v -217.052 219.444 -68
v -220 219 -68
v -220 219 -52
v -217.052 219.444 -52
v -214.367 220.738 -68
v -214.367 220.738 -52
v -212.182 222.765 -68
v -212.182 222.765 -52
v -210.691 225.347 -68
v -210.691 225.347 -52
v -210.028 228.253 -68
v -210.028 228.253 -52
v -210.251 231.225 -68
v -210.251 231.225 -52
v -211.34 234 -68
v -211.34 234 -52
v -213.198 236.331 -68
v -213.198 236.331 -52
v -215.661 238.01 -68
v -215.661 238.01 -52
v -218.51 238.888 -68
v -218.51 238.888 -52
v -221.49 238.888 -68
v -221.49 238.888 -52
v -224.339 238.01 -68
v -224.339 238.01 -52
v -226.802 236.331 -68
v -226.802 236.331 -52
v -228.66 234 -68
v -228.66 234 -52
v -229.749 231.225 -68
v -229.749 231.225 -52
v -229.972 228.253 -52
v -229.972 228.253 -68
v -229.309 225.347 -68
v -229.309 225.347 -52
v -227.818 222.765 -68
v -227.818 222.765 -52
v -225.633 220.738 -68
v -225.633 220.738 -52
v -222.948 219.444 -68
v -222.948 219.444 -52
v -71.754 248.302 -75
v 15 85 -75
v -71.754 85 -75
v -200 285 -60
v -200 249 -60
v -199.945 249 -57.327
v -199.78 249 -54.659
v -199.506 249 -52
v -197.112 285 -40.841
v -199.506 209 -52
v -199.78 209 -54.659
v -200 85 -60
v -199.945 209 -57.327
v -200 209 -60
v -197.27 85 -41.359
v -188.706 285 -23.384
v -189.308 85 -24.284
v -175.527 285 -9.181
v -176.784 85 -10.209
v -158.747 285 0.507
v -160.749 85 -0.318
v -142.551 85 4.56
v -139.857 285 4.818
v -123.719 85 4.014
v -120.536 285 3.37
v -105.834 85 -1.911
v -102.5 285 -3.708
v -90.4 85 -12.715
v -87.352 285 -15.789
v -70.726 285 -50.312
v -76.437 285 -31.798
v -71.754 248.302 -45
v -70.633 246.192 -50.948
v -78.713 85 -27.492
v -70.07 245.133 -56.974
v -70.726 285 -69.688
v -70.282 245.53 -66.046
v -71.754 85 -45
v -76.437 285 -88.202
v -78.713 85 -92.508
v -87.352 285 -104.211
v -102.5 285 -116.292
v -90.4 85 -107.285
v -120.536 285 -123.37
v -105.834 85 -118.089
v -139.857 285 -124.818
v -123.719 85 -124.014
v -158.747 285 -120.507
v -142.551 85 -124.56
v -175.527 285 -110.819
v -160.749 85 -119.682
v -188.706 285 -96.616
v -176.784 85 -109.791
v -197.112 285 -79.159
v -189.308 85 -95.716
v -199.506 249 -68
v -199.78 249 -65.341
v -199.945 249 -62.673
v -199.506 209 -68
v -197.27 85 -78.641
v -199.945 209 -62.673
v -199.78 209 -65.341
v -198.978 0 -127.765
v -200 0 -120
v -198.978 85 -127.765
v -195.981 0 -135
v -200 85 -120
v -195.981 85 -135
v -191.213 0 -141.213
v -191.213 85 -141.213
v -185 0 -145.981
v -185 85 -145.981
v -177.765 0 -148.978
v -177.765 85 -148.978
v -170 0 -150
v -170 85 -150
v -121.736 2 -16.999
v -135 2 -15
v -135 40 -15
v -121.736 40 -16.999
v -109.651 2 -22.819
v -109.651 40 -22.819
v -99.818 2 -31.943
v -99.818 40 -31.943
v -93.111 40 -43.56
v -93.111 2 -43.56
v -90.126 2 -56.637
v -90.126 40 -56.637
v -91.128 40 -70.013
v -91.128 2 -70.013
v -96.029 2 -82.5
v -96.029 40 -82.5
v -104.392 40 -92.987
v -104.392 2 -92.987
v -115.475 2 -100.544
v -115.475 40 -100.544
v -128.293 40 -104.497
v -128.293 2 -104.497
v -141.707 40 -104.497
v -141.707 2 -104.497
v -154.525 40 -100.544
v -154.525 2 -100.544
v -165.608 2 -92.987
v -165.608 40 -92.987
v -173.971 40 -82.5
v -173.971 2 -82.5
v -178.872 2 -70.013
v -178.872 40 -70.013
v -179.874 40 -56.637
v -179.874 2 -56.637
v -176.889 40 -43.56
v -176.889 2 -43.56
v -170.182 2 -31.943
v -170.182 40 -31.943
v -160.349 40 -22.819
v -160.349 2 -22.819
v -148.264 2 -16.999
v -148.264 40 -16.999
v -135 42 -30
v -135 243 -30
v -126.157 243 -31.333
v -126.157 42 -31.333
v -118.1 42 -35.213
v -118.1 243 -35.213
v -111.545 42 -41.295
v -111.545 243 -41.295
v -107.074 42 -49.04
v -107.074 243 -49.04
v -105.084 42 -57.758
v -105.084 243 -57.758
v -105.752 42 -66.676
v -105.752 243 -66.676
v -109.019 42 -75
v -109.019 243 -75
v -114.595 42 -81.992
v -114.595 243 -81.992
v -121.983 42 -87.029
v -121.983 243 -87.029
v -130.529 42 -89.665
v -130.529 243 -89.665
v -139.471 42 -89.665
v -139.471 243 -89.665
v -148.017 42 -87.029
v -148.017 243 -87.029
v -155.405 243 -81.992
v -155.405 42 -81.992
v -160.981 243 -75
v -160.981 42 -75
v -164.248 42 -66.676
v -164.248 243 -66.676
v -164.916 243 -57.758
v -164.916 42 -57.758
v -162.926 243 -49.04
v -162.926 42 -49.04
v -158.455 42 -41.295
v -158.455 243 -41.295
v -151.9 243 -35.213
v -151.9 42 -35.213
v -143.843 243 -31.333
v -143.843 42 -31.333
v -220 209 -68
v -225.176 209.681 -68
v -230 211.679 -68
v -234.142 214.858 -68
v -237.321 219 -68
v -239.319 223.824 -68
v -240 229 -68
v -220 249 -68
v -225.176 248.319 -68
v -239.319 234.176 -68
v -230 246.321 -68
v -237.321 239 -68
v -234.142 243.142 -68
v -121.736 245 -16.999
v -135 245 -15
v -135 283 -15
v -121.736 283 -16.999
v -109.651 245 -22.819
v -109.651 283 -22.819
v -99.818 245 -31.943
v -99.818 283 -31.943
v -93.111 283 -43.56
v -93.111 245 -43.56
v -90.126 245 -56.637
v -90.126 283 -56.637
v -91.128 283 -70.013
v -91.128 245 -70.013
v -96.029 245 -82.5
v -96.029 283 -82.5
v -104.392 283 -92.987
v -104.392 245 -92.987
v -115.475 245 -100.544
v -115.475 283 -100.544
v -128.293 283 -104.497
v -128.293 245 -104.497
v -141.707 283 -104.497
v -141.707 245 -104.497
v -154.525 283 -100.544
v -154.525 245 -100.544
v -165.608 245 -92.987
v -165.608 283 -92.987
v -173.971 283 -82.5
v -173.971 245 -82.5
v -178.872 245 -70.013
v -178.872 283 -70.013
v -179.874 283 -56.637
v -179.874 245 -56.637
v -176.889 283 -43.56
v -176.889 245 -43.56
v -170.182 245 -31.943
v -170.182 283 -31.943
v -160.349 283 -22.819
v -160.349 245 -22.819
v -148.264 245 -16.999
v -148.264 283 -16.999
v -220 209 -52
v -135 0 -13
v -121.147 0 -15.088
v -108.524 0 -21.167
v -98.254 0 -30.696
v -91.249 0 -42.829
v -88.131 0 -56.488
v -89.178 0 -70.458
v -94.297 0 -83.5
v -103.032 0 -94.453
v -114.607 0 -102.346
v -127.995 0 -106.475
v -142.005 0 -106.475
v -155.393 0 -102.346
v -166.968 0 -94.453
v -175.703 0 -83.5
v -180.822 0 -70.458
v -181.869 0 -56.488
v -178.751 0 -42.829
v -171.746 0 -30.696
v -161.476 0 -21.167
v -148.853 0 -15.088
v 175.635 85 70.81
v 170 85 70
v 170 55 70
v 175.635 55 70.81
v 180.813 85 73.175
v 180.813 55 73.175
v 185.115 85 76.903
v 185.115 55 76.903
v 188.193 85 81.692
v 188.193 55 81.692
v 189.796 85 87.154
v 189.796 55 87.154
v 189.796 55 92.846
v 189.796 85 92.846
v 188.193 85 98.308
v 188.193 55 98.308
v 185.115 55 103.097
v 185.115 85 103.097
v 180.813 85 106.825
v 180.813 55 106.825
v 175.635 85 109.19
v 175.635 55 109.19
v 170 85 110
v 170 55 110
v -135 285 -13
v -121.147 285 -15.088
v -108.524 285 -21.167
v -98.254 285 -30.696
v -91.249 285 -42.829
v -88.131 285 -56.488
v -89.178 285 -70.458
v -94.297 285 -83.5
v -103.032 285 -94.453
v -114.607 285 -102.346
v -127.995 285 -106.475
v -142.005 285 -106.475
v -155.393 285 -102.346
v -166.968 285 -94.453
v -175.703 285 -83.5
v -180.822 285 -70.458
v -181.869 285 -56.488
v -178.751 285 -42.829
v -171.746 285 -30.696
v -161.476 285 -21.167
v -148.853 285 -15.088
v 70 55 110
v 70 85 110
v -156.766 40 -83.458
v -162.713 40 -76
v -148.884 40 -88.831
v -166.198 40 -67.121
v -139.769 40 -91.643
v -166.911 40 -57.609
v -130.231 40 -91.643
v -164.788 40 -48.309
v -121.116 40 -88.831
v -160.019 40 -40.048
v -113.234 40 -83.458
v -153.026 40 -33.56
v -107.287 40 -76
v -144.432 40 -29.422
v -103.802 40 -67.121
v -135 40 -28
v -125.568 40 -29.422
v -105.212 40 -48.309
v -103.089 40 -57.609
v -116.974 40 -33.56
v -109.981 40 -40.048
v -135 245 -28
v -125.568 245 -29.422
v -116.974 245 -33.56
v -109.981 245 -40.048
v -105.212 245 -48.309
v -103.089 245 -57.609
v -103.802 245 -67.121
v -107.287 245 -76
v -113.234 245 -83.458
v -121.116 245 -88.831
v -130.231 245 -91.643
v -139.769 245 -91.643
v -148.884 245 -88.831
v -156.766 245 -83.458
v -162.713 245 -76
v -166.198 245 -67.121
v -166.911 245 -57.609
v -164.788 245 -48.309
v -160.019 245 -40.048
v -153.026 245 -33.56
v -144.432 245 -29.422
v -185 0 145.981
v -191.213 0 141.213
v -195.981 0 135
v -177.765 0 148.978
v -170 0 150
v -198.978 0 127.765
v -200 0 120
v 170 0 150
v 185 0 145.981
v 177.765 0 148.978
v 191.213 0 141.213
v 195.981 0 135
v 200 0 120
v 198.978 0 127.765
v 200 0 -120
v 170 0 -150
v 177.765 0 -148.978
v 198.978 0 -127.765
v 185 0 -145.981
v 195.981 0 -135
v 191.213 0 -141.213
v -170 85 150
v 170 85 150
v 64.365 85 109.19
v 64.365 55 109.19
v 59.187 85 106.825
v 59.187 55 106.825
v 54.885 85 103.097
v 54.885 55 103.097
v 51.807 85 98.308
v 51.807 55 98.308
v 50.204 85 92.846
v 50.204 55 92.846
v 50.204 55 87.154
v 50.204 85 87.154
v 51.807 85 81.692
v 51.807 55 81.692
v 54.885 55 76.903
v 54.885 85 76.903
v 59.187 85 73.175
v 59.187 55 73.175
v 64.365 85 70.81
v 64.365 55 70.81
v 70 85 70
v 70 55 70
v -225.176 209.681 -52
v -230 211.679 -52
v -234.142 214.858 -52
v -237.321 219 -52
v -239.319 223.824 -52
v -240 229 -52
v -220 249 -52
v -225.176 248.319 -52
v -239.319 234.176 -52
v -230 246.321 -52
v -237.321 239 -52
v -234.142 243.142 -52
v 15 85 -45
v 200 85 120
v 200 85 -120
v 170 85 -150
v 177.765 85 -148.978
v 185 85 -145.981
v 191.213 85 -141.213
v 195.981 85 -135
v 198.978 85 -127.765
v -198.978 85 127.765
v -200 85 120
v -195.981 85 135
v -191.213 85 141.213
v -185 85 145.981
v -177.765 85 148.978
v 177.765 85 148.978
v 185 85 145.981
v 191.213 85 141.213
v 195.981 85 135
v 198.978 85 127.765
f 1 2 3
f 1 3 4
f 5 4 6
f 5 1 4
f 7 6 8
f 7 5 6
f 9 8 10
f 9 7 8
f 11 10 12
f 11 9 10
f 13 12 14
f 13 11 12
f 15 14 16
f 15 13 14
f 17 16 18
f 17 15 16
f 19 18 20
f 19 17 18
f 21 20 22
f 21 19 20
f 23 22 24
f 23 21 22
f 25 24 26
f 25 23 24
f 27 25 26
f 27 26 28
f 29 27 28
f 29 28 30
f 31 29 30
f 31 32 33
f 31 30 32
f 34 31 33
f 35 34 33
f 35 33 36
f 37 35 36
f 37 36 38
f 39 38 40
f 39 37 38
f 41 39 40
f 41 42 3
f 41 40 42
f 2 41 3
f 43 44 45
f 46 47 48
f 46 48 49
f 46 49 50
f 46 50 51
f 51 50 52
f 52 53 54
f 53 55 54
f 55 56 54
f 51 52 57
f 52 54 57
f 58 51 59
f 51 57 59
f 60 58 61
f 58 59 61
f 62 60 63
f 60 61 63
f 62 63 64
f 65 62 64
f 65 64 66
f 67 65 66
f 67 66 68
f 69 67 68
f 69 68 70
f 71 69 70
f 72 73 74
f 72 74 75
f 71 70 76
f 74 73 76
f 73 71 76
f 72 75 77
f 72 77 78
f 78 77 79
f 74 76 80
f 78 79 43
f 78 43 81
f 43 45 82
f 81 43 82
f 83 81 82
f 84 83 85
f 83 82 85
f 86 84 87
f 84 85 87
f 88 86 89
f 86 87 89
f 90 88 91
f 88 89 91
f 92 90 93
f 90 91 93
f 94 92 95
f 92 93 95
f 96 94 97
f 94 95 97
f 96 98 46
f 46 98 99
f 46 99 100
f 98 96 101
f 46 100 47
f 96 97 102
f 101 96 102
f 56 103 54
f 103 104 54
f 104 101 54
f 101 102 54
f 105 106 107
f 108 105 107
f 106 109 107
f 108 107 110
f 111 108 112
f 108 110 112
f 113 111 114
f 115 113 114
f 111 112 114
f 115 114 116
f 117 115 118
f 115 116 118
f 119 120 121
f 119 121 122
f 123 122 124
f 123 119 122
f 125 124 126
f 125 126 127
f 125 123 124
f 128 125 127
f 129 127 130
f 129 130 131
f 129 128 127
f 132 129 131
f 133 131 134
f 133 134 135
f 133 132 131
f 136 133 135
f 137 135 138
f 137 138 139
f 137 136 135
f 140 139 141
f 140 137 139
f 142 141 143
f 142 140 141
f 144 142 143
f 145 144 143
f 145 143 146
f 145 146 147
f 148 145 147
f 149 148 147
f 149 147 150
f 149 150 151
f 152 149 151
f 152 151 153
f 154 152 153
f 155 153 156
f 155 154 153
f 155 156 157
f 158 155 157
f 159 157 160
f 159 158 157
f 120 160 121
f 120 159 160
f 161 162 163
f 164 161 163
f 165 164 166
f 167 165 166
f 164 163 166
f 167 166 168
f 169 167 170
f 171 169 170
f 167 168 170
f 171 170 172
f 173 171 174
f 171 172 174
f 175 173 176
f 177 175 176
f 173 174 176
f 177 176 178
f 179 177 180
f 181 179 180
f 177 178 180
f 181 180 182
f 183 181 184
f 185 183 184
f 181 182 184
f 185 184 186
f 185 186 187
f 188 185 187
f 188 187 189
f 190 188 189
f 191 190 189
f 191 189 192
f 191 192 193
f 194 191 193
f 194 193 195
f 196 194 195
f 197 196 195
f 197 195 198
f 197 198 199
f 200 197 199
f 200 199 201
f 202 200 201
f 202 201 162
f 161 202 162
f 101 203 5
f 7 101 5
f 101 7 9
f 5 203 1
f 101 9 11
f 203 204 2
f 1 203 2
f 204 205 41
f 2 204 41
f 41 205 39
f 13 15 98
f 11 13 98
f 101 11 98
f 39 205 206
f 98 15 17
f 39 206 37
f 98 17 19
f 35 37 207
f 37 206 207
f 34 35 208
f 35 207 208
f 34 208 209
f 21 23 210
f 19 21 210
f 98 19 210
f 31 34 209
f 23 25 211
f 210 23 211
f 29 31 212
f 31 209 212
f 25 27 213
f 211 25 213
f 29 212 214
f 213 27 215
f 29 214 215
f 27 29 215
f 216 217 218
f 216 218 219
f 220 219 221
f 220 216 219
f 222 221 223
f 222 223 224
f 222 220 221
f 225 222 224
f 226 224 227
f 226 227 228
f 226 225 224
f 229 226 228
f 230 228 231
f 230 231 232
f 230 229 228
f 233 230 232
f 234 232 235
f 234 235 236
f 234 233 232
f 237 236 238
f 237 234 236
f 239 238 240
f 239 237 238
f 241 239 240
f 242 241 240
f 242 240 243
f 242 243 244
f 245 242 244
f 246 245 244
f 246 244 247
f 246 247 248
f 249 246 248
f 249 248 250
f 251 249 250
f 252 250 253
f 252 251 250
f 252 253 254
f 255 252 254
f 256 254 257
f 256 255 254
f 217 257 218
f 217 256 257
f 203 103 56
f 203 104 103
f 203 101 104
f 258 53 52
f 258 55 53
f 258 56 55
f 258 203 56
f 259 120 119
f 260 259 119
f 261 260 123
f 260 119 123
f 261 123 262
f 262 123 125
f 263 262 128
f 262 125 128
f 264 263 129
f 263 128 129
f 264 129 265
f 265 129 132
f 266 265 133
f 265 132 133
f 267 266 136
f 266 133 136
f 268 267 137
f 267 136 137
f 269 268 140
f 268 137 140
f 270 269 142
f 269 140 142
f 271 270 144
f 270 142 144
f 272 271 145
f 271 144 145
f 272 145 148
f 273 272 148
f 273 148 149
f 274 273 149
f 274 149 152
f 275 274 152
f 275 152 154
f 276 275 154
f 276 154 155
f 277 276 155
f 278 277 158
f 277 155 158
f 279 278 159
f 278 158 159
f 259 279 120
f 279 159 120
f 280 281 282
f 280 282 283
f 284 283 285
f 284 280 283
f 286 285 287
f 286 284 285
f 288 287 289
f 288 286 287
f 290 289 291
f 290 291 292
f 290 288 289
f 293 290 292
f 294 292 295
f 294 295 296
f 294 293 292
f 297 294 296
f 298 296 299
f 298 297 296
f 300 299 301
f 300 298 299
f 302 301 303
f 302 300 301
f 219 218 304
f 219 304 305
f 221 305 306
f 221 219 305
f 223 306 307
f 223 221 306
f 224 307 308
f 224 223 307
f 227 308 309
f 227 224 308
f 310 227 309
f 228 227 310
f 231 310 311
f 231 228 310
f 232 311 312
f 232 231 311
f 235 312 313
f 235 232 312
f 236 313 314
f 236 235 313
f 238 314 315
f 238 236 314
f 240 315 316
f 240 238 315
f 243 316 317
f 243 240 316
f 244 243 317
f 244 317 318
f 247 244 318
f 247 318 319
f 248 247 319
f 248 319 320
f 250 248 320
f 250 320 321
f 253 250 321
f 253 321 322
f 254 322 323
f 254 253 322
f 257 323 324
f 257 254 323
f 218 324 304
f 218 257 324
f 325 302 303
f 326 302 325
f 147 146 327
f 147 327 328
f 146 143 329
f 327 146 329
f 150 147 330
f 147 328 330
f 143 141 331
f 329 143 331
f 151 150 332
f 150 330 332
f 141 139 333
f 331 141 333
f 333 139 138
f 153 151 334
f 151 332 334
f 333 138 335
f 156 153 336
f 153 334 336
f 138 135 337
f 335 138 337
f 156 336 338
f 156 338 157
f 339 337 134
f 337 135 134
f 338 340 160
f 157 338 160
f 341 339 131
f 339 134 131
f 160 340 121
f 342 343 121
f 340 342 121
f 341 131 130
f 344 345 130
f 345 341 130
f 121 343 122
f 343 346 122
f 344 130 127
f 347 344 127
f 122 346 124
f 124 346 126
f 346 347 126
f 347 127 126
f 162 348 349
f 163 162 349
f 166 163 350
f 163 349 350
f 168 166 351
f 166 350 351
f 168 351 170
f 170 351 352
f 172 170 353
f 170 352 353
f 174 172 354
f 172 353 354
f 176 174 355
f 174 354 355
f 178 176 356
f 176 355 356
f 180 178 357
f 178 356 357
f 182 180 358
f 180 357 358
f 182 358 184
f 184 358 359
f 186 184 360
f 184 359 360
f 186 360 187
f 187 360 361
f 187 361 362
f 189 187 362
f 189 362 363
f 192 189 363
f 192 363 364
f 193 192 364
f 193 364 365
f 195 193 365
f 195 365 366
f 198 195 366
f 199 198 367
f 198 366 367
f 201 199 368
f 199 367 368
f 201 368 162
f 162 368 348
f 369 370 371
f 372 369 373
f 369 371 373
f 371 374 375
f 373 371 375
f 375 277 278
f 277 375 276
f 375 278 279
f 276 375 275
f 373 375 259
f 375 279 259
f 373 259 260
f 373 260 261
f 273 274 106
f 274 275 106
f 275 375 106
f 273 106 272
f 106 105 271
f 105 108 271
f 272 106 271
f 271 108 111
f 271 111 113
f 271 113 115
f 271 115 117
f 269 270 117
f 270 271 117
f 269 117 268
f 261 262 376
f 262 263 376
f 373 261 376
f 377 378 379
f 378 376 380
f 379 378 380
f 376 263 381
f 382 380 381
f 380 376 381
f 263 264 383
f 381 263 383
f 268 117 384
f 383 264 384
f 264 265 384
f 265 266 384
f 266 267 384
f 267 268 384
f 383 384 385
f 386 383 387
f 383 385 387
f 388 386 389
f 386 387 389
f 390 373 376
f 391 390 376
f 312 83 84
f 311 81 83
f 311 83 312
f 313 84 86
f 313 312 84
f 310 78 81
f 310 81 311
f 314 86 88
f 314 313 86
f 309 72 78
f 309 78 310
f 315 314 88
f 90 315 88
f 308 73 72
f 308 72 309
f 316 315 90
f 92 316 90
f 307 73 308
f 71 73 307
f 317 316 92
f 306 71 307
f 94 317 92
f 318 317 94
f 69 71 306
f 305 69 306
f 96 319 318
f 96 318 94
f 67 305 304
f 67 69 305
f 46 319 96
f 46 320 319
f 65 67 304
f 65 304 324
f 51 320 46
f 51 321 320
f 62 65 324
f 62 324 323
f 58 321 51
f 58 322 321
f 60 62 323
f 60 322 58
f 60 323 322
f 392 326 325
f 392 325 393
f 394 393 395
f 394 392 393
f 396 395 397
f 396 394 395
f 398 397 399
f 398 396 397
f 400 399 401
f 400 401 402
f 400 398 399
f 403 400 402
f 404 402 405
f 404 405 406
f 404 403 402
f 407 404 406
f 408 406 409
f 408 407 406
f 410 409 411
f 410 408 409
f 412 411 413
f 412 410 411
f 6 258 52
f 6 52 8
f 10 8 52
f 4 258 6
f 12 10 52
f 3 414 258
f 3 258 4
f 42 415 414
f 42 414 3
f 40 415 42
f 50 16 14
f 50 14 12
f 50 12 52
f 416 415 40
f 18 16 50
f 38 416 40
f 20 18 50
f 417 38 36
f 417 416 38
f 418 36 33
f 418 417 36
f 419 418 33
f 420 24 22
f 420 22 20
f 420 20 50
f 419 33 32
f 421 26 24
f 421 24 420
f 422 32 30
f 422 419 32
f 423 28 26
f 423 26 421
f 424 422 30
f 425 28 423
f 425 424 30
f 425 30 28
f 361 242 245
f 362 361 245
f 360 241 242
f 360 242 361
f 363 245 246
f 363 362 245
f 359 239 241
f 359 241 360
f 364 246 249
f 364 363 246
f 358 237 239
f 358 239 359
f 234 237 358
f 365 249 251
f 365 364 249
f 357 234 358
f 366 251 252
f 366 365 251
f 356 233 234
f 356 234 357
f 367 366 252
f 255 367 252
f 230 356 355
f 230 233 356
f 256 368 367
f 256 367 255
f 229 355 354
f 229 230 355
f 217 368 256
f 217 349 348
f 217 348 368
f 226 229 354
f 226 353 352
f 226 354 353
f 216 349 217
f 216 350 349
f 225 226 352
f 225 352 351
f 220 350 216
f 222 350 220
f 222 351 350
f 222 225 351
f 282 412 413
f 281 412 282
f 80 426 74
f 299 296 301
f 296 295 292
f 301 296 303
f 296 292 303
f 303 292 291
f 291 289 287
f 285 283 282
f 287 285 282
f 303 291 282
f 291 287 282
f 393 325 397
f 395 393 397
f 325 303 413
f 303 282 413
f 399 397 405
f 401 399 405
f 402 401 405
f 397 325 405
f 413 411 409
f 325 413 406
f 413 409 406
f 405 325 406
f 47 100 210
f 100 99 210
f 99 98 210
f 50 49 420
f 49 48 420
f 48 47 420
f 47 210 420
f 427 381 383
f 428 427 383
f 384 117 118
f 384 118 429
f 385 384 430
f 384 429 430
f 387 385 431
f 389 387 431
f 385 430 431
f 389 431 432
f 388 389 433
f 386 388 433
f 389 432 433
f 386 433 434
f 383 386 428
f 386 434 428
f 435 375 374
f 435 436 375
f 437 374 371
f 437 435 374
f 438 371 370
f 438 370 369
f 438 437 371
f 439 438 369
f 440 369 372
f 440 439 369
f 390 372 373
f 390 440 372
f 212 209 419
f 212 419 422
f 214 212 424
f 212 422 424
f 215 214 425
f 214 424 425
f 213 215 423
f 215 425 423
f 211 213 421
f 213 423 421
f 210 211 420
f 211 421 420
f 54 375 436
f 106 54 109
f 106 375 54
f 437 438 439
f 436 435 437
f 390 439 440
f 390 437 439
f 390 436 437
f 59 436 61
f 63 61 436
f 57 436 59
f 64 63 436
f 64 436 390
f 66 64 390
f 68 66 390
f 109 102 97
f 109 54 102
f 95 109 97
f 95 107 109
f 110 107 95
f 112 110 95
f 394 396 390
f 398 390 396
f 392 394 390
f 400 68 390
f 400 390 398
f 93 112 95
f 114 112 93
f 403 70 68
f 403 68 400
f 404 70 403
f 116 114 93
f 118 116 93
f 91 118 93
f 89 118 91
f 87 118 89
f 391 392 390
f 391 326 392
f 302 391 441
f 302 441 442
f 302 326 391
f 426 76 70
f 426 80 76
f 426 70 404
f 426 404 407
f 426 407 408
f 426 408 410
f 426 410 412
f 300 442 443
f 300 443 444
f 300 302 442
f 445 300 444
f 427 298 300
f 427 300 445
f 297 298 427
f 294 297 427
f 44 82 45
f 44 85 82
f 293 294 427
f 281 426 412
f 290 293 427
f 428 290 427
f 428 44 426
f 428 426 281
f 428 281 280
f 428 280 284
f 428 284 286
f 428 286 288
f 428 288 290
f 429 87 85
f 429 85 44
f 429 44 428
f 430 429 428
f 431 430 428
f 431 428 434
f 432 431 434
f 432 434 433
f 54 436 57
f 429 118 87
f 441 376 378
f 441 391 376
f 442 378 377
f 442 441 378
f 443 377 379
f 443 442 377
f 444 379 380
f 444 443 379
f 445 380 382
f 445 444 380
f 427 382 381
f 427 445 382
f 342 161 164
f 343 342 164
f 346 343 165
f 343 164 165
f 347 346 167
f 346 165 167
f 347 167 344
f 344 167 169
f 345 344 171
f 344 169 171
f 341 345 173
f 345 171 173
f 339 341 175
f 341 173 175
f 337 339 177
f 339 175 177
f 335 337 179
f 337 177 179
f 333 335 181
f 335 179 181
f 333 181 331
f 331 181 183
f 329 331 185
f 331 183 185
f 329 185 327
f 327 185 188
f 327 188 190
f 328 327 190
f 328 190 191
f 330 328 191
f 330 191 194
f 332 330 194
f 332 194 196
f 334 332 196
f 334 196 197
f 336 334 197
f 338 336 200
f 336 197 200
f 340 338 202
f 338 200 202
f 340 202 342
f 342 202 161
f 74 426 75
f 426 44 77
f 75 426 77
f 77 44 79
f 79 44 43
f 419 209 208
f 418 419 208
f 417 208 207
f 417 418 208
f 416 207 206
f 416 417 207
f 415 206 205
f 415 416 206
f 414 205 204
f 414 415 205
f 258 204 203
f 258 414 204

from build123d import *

# Parameters (mm, degrees)
SKETCH1_W                = 400
SKETCH1_H                = 300
BOSS_EXTRUDE1_DEPTH      = 85
SKETCH2_R                = 65
BOSS_EXTRUDE2_DEPTH      = 200
FILLET1_R                = 30
CUT_EXTRUDE1_DEPTH       = 30
RIB1_REACH               = 408.602
SKETCH4_WALL_W           = 996.380250876
SKETCH4_WALL_H           = 30
SKETCH6_R                = 30
CUT_EXTRUDE2_DEPTH       = 380.110801745
SKETCH7_R                = 45
CUT_EXTRUDE3_DEPTH       = 40
CUT_EXTRUDE4_START       = -40
SKETCH8_R                = 45
CUT_EXTRUDE4_DEPTH       = 40
CHAMFER1_SIZE            = 2
BOSS_EXTRUDE3_REACH      = 547.275
BOSS_EXTRUDE3_END_RADIUS = 65
SKETCH9_W                = 16
SKETCH9_H                = 40
FILLET2_R                = 20
CUT_EXTRUDE5_DEPTH       = 424.826615493
CUT_EXTRUDE5_DEPTH_BACK  = 424.826615493
SKETCH10_R               = 10


with BuildPart() as part:
    # Sketch1 → Boss-Extrude1 (new body)
    with BuildSketch(Plane(origin=(0, 0, 0), x_dir=(1, 0, 0), z_dir=(0, 1, 0))):
        Rectangle(SKETCH1_W, SKETCH1_H)
    extrude(amount=BOSS_EXTRUDE1_DEPTH)

    # Sketch2 → Boss-Extrude2 (add)
    with BuildSketch(Plane(origin=(0, 85, 0), x_dir=(1, 0, 0), z_dir=(0, 1, 0))):
        with Locations(Location((-135, 60, 0), (0, 0, 180))):
            Circle(SKETCH2_R)
    extrude(amount=BOSS_EXTRUDE2_DEPTH)

    # Fillet1
    fillet1_edges = [part.edges().sort_by_distance(p)[0] for p in [
        (200, 42.5, 150),
        (-200, 42.5, 150),
        (-200, 42.5, -150),
        (200, 42.5, -150),
    ]]
    fillet(fillet1_edges, radius=FILLET1_R)

    # Sketch3 → Cut-Extrude1 (cut)
    with BuildSketch(Plane(origin=(0, 85, 0), x_dir=(1, 0, 0), z_dir=(0, 1, 0))):
        with BuildLine():
            Line((70, -70), (170, -70))
            ThreePointArc((170, -70), (190, -90), (170, -110))
            Line((170, -110), (70, -110))
            ThreePointArc((70, -110), (50, -90), (70, -70))
        make_face()
    extrude(amount=-CUT_EXTRUDE1_DEPTH, mode=Mode.SUBTRACT)

    # Sketch4 wall → Rib1 (add, up to next)
    with BuildSketch(Plane(origin=(-27.5, 165, -60), x_dir=(-0.469155225962, 0.883115719457, 0), z_dir=(-0.883115719457, -0.469155225962, 0)), mode=Mode.PRIVATE) as rib1_sk1:
        Rectangle(SKETCH4_WALL_W, SKETCH4_WALL_H)
    rib1_tool1 = extrude(rib1_sk1.sketch, amount=RIB1_REACH, mode=Mode.PRIVATE) - part.part
    add(rib1_tool1.solids().sort_by_distance((-27.5, 165, -60))[0])

    # Sketch6 → Cut-Extrude2 (cut, through all)
    with BuildSketch(Plane(origin=(0, 285, 0), x_dir=(1, 0, 0), z_dir=(0, 1, 0))):
        with Locations(Location((-135, 60, 0), (0, 0, 270))):
            Circle(SKETCH6_R)
    extrude(amount=-CUT_EXTRUDE2_DEPTH, mode=Mode.SUBTRACT)

    # Sketch7 → Cut-Extrude3 (cut)
    with BuildSketch(Plane(origin=(0, 0, 0), x_dir=(1, 0, 0), z_dir=(0, 1, 0))):
        with Locations(Location((-135, 60, 0), (0, 0, 270))):
            Circle(SKETCH7_R)
    extrude(amount=CUT_EXTRUDE3_DEPTH, mode=Mode.SUBTRACT)

    # Sketch8 → Cut-Extrude4 (cut)
    with BuildSketch(Plane(origin=(0, 285, 0), x_dir=(1, 0, 0), z_dir=(0, 1, 0)).offset(CUT_EXTRUDE4_START)):
        with Locations(Location((-135, 60, 0), (0, 0, 270))):
            Circle(SKETCH8_R)
    extrude(amount=CUT_EXTRUDE4_DEPTH, mode=Mode.SUBTRACT)

    # Chamfer1
    chamfer1_edges = [part.edges().sort_by_distance(p)[0] for p in [
        (-135, 285, -105),
        (-135, 245, -90),
        (-135, 40, -90),
        (-135, 0, -105),
    ]]
    chamfer(chamfer1_edges, length=CHAMFER1_SIZE)

    # Boss-Extrude3: up to this cylinder (the profile starts outside it)
    boss_extrude3_end = Plane(origin=(-135, 229, -60), z_dir=(0, -1, 0)) * Cylinder(BOSS_EXTRUDE3_END_RADIUS, 1225.55, mode=Mode.PRIVATE)
    # Sketch9 → Boss-Extrude3 (add, up to the surface)
    with BuildSketch(Plane.ZY.offset(240), mode=Mode.PRIVATE) as boss_extrude3_sk1:
        with Locations((-60, 229)):
            Rectangle(SKETCH9_W, SKETCH9_H)
    boss_extrude3_tool1 = extrude(boss_extrude3_sk1.sketch, amount=-BOSS_EXTRUDE3_REACH, mode=Mode.PRIVATE) - boss_extrude3_end
    add(boss_extrude3_tool1.solids().sort_by_distance((-240, 229, -60))[0])

    # Fillet2
    fillet2_edges = [part.edges().sort_by_distance(p)[0] for p in [
        (-240, 209, -60),
        (-240, 249, -60),
    ]]
    fillet(fillet2_edges, radius=FILLET2_R - 0.0001)  # a hair under: the kernel refuses the full size

    # Sketch10 → Cut-Extrude5 (cut, two sides: drawn at the far end of the back side and taken through both)
    with BuildSketch(Plane.XY.offset(-52).offset(-CUT_EXTRUDE5_DEPTH_BACK)):
        with Locations(Location((-220, 229, 0), (0, 0, 270))):
            Circle(SKETCH10_R)
    extrude(amount=CUT_EXTRUDE5_DEPTH + CUT_EXTRUDE5_DEPTH_BACK, mode=Mode.SUBTRACT)


solid = part.part
